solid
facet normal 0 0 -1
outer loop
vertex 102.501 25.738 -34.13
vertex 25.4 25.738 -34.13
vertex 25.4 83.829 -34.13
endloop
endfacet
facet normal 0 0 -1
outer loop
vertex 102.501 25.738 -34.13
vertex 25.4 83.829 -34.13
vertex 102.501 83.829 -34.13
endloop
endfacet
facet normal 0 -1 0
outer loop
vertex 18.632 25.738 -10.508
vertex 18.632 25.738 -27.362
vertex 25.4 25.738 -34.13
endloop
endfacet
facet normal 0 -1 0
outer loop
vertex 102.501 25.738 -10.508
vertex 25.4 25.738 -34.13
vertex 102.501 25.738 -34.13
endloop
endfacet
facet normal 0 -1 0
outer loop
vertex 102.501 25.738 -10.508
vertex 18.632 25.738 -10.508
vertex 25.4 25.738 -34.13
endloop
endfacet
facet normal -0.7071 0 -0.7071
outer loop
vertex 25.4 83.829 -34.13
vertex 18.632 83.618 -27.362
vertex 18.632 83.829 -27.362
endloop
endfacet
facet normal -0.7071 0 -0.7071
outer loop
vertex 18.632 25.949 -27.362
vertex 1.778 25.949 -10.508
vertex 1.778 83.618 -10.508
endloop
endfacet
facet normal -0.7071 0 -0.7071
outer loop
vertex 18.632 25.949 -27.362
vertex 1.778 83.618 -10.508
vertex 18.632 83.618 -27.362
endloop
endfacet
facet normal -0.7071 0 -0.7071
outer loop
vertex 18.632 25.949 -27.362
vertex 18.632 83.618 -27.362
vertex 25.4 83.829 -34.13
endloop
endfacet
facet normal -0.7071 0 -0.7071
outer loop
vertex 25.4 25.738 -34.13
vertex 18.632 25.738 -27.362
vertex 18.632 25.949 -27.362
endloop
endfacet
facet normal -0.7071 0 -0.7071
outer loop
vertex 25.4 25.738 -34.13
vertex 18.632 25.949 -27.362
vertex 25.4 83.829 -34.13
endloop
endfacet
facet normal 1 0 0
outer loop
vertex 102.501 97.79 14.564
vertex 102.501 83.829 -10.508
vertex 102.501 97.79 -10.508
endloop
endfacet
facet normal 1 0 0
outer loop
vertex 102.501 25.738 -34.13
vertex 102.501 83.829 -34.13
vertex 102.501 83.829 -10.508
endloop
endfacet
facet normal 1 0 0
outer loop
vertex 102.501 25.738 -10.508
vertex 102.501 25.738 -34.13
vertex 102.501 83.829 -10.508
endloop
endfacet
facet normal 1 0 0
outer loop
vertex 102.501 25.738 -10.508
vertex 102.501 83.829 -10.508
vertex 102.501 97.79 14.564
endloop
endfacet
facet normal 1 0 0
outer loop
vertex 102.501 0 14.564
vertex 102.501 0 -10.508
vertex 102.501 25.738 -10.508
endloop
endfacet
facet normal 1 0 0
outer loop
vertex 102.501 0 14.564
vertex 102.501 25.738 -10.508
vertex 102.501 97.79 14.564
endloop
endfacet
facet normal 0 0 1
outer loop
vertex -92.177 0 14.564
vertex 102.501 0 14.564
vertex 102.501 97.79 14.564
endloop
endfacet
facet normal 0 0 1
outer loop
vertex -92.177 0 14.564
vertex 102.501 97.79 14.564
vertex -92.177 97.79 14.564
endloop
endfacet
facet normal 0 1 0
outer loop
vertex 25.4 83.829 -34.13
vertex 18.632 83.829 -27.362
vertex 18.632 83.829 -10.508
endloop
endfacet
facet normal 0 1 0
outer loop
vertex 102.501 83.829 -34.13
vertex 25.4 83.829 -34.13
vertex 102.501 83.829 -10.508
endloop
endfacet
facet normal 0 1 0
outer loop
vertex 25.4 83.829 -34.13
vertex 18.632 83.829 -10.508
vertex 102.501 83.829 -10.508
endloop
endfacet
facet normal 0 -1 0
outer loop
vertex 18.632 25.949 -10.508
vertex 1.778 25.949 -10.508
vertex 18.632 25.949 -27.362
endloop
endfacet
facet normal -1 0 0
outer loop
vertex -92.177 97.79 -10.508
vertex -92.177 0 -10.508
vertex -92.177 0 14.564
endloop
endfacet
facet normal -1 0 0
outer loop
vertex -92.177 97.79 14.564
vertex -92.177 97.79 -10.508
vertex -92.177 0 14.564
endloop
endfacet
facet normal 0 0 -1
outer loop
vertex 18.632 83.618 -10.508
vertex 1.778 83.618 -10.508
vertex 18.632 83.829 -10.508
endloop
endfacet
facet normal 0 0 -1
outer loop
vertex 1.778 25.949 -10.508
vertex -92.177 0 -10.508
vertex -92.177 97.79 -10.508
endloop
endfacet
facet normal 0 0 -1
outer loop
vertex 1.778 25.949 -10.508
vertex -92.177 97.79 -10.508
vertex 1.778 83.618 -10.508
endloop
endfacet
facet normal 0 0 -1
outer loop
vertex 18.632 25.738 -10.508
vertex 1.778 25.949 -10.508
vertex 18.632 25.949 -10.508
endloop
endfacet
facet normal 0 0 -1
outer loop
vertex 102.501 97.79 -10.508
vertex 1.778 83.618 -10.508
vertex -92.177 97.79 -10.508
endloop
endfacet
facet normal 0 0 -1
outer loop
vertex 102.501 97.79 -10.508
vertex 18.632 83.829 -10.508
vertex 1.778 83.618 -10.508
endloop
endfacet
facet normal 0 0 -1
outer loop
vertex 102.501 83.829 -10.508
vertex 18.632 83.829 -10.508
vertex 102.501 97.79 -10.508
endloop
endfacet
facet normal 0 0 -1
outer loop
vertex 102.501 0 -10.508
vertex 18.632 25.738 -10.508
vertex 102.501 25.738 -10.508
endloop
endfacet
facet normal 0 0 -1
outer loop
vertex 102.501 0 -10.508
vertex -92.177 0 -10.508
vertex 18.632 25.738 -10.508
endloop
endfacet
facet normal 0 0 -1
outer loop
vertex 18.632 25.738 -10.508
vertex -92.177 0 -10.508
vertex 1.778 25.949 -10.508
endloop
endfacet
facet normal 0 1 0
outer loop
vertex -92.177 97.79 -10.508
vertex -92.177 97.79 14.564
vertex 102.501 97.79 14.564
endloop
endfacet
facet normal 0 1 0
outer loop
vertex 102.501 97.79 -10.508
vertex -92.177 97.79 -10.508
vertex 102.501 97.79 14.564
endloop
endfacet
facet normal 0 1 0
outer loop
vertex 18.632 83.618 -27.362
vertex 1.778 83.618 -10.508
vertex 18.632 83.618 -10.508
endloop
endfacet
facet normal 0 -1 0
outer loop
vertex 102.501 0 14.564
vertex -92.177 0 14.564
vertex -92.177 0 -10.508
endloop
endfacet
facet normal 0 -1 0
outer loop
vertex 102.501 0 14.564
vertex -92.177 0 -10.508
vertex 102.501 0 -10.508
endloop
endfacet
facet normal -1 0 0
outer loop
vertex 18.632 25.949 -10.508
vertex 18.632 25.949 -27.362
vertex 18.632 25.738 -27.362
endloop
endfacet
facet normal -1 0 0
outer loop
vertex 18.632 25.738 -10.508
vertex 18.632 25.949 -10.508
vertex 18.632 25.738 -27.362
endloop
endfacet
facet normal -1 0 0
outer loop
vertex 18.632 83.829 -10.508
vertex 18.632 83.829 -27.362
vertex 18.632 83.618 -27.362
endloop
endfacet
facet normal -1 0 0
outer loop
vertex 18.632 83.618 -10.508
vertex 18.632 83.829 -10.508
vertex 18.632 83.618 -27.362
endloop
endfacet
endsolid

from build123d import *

# Parameters (mm, degrees)
F0_W        = 16.0388723016
F0_H        = 25.0722588971
F0_W_2      = 17.1450078487
F0_W_3      = 20.0946815312
F0_H_2      = 7.0054841926
F1_DEPTH    = 97.79
F2_W        = 83.8691648096
F2_H        = 58.0902062356
F4_DEPTH    = 23.622
F5_W        = 18.6321306974
F5_H        = 57.669268921
F6_DEPTH    = 23.622
F7_T4_DEPTH = 188.3107647097


# Not quite as in the source:
# - a fillet or chamfer that OpenCascade refuses, or shapes differently, is made with other operations: its cross-section is extruded or revolved along the edge and cut away or added


with BuildPart() as f1:
    # F0 (on Front) → F1 (new body)
    with BuildSketch(Plane.XZ):
        with Locations((-84.1579847038, 2.0279032178)):
            Rectangle(F0_W, F0_H)
        with Locations((93.9287915826, 2.0279032178)):
            Rectangle(F0_W_2, F0_H)
        Polygon((85.3562876582, 14.5640326664), (-76.138548553, 14.5640326664), (-76.138548553, -10.5082262307), (11.0612912104, -10.5082262307), (53.2785467803, -10.5082262307), (53.2785467803, -3.5027420381), (53.2785467803, 3.5027421545), (73.3732283115, 3.5027421545), (73.3732283115, -3.5027420381), (73.3732283115, -10.5082262307), (85.3562876582, -10.5082262307), align=None)
        with Locations((63.3258875459, 5.82e-08)):
            Rectangle(F0_W_3, F0_H_2)
        with Locations((63.3258875459, -7.0054841344)):
            Rectangle(F0_W_3, F0_H_2)
    extrude(amount=-F1_DEPTH)

    # F2 (on face) → F4 (join)
    with BuildSketch(Plane(origin=(0, 0, -10.5082262307), x_dir=(1, 0, 0), z_dir=(0, 0, -1))):
        with Locations((60.5667131022, -54.7835994512)):
            Rectangle(F2_W, F2_H)
    extrude(amount=F4_DEPTH)

    # F5 (on face) → F6 (join)
    with BuildSketch(Plane(origin=(0, 0, -10.5082262307), x_dir=(1, 0, 0), z_dir=(0, 0, -1))):
        with Locations((9.3160653487, -54.7836041078)):
            Rectangle(F5_W, F5_H)
    extrude(amount=F6_DEPTH)

    # F7: chamfer of 25.4 on 1 edges, made by hand


with BuildPart() as f7_tool2:
    # F7_s3 → F7_t4 (new body)
    with BuildSketch(Plane.XZ.offset(39.371778247)):
        Polygon((0, -8.7302262307), (25.4, -34.1302262307), (0, -34.1302262307), align=None)
    extrude(amount=-F7_T4_DEPTH)

    split(bisect_by=Plane.XY.offset(-10.5082262307), keep=Keep.BOTTOM)


with BuildPart() as f1_1:
    add(f1.part)

    # F7_t1: cut F7_tool2
    add(f7_tool2.part, mode=Mode.SUBTRACT)


solid = f1_1.part
